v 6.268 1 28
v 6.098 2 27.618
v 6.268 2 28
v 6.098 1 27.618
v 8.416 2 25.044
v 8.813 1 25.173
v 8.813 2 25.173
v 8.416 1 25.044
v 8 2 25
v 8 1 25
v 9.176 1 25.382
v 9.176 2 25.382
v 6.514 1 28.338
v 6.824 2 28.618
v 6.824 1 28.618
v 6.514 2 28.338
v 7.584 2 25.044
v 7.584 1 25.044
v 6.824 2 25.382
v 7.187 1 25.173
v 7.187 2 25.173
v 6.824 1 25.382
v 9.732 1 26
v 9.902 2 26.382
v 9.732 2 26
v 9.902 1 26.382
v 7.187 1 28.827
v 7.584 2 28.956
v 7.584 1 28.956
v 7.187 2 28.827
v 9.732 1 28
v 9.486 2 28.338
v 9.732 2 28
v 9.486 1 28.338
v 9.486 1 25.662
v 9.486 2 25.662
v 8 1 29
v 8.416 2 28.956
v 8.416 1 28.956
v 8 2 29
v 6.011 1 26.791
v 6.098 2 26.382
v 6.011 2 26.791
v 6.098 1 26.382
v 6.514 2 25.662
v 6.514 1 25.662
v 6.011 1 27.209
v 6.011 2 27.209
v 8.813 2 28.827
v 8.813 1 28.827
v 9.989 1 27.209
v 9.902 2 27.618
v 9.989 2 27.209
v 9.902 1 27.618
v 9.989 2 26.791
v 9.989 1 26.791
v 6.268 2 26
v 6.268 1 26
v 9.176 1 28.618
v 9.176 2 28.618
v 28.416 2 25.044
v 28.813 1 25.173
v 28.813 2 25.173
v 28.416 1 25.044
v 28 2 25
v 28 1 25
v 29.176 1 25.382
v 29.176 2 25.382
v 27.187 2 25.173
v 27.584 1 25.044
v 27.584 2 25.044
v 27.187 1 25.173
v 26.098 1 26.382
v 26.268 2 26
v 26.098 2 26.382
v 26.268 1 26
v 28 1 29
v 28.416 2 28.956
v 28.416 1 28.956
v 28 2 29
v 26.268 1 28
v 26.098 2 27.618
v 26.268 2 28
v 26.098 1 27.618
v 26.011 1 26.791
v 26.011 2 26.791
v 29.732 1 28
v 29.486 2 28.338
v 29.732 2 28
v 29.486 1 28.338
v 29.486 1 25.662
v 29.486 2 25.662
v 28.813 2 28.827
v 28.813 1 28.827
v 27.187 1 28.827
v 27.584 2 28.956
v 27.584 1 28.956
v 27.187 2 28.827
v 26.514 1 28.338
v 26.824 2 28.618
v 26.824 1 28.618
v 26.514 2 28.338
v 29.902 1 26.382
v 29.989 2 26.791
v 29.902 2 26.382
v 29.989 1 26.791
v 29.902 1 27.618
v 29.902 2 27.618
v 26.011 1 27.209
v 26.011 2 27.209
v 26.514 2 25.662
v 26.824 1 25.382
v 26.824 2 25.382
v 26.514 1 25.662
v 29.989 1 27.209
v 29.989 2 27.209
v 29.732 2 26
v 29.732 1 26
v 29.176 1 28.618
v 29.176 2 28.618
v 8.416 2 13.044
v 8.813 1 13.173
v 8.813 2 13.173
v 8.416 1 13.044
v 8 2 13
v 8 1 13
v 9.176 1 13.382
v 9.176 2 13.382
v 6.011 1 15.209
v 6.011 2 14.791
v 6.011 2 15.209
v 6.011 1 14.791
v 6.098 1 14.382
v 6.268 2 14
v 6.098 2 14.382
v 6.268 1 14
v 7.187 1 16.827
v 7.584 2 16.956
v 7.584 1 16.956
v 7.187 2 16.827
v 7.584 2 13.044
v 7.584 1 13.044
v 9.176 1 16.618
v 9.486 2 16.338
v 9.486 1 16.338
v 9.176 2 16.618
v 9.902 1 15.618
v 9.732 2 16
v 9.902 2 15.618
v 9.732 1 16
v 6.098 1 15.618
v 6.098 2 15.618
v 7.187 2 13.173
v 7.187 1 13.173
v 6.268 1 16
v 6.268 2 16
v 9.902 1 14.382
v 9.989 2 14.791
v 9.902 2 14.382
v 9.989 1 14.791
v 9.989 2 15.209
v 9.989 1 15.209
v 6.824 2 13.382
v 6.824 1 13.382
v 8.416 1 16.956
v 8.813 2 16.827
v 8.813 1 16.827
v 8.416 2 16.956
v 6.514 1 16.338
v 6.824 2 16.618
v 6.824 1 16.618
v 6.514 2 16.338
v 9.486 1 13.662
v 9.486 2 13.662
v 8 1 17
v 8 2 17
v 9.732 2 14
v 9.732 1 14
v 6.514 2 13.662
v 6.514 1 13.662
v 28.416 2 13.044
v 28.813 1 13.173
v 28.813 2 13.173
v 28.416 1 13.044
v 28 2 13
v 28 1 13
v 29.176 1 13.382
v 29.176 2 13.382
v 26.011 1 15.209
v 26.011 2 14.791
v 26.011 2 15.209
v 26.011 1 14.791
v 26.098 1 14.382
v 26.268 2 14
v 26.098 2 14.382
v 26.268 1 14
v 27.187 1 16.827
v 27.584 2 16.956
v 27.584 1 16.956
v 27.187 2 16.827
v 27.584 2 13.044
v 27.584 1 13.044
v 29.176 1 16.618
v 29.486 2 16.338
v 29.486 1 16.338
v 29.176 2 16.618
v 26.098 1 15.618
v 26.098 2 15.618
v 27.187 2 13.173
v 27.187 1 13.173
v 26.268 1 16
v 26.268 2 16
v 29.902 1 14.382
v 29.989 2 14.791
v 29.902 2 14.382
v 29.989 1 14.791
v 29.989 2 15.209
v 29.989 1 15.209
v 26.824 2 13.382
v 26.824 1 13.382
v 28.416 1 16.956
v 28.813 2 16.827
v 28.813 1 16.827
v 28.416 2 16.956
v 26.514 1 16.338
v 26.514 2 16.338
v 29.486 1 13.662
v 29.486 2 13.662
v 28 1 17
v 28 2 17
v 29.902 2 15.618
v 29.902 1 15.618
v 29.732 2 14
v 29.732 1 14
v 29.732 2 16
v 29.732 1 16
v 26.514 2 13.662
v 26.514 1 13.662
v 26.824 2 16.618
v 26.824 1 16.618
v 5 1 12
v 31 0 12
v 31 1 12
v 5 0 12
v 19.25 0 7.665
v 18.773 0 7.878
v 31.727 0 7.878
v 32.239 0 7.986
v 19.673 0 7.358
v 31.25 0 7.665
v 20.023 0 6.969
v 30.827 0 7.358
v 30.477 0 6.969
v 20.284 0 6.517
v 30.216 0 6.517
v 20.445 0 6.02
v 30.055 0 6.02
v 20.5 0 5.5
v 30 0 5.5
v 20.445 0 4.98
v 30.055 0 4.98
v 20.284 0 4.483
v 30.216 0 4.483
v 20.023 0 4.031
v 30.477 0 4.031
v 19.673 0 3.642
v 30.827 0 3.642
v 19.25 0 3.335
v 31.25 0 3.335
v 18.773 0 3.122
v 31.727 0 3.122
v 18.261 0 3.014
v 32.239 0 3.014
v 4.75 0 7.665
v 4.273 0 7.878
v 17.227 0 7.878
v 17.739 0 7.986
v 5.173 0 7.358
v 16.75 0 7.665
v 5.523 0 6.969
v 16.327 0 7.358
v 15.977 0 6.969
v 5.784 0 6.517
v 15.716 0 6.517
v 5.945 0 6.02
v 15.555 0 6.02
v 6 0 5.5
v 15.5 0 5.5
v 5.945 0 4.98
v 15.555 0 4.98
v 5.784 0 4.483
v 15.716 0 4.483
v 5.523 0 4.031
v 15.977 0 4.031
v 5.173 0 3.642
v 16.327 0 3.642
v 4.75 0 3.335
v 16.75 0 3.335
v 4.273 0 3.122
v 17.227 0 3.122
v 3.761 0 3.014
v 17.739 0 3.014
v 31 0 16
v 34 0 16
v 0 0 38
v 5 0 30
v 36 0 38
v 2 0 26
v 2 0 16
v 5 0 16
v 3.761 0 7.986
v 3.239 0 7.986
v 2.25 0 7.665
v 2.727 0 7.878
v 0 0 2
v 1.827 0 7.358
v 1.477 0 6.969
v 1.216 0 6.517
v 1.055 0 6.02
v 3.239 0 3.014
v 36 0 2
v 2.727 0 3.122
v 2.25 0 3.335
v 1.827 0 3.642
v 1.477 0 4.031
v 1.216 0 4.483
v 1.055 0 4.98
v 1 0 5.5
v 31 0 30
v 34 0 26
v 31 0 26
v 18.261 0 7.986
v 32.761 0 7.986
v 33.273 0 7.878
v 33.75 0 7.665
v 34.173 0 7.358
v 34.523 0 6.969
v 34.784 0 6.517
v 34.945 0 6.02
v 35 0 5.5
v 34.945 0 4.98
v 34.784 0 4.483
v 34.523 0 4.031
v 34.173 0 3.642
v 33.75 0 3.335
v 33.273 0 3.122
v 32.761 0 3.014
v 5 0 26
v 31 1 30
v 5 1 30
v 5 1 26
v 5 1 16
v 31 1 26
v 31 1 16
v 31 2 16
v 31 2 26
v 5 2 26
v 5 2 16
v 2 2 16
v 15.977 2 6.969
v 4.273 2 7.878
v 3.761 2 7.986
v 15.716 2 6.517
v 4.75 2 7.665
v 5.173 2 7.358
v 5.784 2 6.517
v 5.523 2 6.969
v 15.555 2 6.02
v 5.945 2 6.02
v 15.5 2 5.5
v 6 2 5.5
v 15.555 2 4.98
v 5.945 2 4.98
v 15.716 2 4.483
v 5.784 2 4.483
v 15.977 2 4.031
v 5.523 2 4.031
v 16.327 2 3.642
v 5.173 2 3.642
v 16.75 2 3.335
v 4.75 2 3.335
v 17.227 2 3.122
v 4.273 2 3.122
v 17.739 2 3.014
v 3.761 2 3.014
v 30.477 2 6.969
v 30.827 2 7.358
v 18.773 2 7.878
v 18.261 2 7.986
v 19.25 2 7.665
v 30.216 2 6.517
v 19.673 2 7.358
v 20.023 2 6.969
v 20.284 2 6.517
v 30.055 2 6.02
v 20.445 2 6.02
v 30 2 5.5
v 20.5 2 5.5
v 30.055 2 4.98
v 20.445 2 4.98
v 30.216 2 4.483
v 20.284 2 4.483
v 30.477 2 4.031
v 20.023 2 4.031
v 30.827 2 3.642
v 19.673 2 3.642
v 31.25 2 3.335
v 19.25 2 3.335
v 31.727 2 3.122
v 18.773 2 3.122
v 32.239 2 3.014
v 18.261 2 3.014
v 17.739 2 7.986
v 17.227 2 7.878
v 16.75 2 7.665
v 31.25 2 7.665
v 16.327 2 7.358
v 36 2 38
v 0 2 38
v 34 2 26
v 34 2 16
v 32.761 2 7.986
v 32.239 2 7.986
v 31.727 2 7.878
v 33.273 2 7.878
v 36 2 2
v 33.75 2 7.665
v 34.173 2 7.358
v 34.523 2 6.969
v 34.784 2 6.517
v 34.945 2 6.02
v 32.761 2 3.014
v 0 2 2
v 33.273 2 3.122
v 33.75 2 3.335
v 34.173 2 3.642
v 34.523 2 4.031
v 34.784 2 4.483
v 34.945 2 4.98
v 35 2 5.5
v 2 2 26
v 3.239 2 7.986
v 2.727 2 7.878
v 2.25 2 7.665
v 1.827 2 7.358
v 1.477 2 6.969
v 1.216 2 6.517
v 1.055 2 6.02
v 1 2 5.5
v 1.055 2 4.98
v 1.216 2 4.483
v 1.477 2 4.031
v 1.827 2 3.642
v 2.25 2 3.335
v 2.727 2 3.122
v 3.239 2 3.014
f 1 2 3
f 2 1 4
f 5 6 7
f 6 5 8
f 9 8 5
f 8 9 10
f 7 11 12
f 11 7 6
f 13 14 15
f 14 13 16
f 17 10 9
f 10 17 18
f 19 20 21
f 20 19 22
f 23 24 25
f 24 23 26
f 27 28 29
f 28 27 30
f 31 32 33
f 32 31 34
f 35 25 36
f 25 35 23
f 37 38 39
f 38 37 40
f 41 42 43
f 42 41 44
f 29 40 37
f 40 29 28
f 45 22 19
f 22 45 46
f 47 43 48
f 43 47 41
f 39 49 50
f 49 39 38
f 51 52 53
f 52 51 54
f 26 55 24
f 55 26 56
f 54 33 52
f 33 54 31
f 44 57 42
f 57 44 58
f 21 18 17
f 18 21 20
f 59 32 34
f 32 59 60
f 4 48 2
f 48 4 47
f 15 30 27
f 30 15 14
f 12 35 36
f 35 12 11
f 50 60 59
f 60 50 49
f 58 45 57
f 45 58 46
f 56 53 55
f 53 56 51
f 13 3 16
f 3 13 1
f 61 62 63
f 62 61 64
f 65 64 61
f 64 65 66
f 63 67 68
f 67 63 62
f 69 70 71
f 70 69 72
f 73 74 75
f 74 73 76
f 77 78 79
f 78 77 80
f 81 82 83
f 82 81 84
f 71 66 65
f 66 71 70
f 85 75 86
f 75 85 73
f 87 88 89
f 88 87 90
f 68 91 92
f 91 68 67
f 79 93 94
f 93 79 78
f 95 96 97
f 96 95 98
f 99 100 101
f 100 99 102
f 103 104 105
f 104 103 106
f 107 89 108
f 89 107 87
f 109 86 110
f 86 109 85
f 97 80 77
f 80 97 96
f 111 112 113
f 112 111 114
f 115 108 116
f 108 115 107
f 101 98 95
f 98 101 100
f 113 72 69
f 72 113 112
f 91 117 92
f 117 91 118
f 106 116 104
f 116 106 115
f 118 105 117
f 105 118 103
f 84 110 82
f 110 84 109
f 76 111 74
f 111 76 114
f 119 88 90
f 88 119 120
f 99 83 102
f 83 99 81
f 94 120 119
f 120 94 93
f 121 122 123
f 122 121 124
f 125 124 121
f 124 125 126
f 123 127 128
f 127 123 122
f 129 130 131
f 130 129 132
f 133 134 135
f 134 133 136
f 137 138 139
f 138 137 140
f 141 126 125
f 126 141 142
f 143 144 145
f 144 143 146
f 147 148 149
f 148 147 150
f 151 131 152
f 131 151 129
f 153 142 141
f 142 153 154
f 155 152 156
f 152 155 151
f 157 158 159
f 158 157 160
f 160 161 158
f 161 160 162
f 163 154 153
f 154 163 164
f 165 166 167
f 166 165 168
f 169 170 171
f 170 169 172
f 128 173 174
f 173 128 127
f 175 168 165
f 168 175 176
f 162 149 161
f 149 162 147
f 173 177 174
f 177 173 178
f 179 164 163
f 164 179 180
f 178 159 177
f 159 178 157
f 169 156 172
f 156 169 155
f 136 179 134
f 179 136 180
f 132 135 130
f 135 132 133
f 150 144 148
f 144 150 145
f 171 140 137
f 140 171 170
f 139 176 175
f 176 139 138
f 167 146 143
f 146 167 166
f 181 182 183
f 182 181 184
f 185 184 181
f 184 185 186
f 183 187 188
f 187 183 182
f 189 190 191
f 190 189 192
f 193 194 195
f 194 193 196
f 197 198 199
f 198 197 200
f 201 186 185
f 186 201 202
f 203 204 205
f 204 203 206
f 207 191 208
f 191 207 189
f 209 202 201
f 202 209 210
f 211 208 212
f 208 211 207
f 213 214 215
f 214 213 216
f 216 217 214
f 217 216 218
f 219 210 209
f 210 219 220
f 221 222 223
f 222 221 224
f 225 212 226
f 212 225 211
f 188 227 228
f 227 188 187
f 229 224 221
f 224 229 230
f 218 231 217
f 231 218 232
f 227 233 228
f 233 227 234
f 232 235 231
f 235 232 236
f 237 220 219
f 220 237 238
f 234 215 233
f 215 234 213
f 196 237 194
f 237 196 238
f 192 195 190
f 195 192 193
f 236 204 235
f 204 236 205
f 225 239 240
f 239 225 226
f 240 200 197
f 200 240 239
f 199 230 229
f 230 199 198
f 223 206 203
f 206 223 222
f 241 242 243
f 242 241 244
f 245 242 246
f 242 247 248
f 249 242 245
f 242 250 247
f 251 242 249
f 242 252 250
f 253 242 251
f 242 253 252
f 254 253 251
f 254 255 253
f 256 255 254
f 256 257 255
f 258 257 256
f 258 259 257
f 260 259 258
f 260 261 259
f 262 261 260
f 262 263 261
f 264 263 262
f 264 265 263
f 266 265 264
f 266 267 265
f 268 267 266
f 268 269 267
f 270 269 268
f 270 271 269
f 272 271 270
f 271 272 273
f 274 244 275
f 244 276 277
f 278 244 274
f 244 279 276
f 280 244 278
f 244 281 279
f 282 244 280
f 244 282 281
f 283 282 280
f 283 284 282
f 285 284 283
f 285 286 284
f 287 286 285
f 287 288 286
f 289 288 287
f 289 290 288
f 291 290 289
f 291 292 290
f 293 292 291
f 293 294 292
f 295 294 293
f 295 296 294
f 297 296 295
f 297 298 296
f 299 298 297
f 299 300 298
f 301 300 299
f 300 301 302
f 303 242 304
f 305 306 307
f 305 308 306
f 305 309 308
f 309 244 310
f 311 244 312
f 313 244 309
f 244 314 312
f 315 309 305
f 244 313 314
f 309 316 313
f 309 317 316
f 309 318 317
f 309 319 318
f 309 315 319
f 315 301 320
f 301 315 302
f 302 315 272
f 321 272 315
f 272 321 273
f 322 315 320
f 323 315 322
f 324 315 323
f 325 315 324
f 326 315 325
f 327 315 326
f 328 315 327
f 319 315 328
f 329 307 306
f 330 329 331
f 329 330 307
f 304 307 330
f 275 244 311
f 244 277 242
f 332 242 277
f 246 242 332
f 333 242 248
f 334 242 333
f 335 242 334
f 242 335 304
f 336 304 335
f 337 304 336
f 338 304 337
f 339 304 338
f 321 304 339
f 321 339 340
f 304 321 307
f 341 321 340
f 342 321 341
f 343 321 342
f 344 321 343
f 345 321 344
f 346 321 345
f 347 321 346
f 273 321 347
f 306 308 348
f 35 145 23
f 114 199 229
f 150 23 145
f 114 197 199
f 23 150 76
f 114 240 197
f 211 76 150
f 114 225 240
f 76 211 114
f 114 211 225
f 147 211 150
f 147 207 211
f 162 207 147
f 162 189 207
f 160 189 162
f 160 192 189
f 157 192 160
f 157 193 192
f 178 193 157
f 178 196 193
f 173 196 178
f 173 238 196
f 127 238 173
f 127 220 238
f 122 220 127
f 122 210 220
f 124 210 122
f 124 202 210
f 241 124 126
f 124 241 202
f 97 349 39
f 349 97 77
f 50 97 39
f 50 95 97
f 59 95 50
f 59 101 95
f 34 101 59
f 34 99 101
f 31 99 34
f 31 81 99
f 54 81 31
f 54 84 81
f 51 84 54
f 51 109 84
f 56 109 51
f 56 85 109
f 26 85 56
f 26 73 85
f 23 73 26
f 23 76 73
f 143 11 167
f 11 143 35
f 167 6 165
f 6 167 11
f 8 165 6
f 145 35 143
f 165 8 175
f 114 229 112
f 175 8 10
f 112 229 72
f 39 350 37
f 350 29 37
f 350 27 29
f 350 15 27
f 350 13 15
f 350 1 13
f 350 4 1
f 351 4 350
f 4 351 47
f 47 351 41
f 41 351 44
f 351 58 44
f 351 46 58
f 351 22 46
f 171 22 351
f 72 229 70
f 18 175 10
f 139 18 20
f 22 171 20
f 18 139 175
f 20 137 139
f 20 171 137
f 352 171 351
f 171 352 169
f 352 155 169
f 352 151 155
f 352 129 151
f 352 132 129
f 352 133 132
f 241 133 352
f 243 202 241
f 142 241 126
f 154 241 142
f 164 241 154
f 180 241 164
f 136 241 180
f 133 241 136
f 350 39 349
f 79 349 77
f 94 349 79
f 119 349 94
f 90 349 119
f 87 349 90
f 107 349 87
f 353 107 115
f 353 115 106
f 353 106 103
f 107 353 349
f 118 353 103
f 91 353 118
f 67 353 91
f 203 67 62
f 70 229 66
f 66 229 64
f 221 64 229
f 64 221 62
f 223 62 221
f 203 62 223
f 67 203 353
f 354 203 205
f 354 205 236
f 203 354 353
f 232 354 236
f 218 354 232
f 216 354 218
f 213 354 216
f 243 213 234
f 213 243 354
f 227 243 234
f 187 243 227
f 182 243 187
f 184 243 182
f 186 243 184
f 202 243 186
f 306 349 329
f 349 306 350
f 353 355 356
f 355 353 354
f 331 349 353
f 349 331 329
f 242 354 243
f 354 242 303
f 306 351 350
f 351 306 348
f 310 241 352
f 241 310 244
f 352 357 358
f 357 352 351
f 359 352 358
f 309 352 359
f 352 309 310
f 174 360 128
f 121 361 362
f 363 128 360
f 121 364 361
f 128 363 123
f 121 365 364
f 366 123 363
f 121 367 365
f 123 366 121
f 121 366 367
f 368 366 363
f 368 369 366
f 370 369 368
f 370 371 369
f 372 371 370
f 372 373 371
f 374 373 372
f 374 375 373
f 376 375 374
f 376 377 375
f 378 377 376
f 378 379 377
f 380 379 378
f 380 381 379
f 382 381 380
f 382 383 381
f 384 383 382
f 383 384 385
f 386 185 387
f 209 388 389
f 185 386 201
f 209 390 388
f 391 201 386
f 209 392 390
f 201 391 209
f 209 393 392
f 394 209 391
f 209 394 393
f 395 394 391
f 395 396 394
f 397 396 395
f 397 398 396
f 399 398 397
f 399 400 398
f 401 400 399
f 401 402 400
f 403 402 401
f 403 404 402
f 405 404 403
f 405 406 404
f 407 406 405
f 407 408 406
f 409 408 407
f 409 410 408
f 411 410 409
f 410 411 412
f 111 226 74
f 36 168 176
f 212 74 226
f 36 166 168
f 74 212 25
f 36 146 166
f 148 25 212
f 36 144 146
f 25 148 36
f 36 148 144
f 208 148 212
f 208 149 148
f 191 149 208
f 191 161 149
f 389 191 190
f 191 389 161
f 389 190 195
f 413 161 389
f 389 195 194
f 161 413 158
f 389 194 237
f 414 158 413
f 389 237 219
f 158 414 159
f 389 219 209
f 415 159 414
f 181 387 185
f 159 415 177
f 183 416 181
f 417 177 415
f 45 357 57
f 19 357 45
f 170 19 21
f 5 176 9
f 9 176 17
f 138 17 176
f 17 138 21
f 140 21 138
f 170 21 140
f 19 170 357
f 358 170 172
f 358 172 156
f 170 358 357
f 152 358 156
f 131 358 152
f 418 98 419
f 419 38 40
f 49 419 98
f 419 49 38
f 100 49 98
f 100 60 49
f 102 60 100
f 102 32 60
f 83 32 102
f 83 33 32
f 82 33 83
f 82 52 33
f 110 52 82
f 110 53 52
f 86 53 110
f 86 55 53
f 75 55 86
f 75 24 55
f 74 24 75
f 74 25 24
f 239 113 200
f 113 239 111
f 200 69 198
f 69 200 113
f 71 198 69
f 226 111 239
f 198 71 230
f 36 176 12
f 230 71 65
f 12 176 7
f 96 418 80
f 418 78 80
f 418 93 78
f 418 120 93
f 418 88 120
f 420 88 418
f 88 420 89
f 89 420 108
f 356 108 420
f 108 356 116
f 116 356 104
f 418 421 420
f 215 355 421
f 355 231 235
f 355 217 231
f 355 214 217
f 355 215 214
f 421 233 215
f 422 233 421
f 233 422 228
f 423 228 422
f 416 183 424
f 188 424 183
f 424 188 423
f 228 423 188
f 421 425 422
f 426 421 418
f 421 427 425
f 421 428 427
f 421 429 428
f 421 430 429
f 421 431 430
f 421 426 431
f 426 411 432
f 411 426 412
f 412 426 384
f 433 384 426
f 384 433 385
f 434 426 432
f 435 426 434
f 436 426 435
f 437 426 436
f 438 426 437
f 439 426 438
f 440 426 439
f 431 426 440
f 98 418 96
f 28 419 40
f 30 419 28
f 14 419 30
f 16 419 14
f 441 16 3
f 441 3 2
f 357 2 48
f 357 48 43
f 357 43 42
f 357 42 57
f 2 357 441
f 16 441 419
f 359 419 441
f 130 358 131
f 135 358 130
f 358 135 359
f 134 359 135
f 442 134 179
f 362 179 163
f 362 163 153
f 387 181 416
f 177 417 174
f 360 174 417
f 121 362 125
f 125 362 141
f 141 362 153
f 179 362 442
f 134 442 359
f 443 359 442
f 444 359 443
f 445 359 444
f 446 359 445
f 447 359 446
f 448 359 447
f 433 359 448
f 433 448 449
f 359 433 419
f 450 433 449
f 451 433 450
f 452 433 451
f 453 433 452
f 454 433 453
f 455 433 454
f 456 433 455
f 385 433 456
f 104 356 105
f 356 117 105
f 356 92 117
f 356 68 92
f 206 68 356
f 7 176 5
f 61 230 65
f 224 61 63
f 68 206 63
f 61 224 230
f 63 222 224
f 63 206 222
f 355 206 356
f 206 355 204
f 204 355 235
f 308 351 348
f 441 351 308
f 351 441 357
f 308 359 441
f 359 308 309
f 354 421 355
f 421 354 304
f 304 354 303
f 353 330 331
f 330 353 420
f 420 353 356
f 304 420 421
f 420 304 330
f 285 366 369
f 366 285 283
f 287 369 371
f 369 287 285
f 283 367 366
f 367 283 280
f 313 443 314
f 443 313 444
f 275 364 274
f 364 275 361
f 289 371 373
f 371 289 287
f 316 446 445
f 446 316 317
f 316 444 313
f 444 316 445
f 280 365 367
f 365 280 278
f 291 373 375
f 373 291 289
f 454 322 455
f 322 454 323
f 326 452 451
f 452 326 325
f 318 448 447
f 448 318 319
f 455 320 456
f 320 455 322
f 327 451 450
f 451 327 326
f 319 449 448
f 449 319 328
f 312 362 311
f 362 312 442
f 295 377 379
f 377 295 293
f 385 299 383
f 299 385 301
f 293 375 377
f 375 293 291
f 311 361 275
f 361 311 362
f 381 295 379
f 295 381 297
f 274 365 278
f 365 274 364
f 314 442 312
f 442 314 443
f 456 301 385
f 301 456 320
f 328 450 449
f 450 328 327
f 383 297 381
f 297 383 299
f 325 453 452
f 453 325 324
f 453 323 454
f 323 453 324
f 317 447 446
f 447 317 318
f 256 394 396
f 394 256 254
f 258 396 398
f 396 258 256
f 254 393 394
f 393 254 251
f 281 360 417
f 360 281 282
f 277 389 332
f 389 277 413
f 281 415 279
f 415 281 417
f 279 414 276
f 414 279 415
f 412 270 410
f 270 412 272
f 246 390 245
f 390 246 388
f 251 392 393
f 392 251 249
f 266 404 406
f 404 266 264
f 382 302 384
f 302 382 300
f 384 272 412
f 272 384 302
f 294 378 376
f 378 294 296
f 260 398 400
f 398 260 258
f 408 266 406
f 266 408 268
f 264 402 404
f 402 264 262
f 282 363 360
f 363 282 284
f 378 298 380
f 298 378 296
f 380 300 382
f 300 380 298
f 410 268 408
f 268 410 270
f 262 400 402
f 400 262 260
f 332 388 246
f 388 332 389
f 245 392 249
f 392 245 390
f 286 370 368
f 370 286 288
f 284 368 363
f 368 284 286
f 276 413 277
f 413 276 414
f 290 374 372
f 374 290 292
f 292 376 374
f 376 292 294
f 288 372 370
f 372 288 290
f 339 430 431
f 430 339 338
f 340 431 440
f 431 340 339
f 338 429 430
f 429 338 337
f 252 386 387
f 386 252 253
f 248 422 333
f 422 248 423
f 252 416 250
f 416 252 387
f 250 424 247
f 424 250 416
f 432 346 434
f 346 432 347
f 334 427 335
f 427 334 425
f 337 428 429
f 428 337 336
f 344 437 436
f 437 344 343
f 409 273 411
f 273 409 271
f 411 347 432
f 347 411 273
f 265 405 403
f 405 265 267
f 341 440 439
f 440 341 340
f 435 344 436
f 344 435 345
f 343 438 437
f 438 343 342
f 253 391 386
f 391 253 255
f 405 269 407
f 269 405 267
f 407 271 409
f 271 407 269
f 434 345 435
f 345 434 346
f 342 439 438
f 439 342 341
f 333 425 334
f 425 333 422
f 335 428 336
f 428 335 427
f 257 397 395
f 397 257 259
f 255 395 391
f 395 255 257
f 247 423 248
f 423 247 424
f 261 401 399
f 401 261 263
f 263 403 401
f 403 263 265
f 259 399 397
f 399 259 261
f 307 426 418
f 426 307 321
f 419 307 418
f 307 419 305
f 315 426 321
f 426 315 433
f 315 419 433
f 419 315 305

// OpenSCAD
$fn = 30;
CYLINDER_X = 6.1;
CYLINDER_Y = 6;
CYLINDER_Z = 25;
BASE_WIDTH = 70.25;
BASE_LENGTH = 62;
PICASE_X = 45.5;
PICASE_Y = 31;
PICASE_Z = 6;

COLOR_WIDTH = 22;

TOF_LEN = 26;
TOF_WIDTH = 18;

module cylinders2(h, r1, r2, LEN, WIDTH) {
     for (i = [0:WIDTH:WIDTH]){
         for (n = [0:LEN:LEN]){
             translate([i,n,0])cylinder(h, r1, r2);
         }
     }    
} 

module cylinders3(h, r1, r2, LEN, WIDTH, xNum, yNum) {
     for (i = [0:WIDTH/(xNum-1):WIDTH]){
         for (n = [0:LEN/(yNum-1):LEN]){
             translate([i,n,0])cylinder(h, r1, r2);
         }
     }    
} 

module tof(LEN, WIDTH, radius){
        translate([0,0,2]) cube([WIDTH, LEN, 1]);
        translate([radius+1,radius+1,0]) cylinders2(6, 2, 2, LEN-(radius+1)*2,WIDTH-(radius+1)*2);
        translate([WIDTH/2-10/2,-3,1]) cube([10,3,4]);
        translate([WIDTH/2-10/2,LEN,1]) cube([10,3,4]);
}

module camera(LEN,WIDTH,radius){
        translate([0,0,2]) cube([WIDTH+6, LEN, 1]);
        translate([radius+2,radius+2,0]) cylinders2(6, 1.25, 1.25, LEN-(radius+2)*2,WIDTH-(radius+2)*2);
        translate([18,0,0]) cube([8,LEN,10]);
       
}

module sidePiece(WIDTH,LEN,radius){
    difference(){
        translate([0,0,2]) cube([WIDTH,2,LEN]);
        translate([5,3,30]) rotate([90,90,0])tof(TOF_LEN,TOF_WIDTH,2);
        rotate([90,0,0]) translate([radius+1,radius+1+2,-2]) cylinders3(6,radius,radius,LEN-(radius+1)*2,WIDTH-(radius+1)*2,3,1);
    }
}


sidePiece(36,36,2.5);
